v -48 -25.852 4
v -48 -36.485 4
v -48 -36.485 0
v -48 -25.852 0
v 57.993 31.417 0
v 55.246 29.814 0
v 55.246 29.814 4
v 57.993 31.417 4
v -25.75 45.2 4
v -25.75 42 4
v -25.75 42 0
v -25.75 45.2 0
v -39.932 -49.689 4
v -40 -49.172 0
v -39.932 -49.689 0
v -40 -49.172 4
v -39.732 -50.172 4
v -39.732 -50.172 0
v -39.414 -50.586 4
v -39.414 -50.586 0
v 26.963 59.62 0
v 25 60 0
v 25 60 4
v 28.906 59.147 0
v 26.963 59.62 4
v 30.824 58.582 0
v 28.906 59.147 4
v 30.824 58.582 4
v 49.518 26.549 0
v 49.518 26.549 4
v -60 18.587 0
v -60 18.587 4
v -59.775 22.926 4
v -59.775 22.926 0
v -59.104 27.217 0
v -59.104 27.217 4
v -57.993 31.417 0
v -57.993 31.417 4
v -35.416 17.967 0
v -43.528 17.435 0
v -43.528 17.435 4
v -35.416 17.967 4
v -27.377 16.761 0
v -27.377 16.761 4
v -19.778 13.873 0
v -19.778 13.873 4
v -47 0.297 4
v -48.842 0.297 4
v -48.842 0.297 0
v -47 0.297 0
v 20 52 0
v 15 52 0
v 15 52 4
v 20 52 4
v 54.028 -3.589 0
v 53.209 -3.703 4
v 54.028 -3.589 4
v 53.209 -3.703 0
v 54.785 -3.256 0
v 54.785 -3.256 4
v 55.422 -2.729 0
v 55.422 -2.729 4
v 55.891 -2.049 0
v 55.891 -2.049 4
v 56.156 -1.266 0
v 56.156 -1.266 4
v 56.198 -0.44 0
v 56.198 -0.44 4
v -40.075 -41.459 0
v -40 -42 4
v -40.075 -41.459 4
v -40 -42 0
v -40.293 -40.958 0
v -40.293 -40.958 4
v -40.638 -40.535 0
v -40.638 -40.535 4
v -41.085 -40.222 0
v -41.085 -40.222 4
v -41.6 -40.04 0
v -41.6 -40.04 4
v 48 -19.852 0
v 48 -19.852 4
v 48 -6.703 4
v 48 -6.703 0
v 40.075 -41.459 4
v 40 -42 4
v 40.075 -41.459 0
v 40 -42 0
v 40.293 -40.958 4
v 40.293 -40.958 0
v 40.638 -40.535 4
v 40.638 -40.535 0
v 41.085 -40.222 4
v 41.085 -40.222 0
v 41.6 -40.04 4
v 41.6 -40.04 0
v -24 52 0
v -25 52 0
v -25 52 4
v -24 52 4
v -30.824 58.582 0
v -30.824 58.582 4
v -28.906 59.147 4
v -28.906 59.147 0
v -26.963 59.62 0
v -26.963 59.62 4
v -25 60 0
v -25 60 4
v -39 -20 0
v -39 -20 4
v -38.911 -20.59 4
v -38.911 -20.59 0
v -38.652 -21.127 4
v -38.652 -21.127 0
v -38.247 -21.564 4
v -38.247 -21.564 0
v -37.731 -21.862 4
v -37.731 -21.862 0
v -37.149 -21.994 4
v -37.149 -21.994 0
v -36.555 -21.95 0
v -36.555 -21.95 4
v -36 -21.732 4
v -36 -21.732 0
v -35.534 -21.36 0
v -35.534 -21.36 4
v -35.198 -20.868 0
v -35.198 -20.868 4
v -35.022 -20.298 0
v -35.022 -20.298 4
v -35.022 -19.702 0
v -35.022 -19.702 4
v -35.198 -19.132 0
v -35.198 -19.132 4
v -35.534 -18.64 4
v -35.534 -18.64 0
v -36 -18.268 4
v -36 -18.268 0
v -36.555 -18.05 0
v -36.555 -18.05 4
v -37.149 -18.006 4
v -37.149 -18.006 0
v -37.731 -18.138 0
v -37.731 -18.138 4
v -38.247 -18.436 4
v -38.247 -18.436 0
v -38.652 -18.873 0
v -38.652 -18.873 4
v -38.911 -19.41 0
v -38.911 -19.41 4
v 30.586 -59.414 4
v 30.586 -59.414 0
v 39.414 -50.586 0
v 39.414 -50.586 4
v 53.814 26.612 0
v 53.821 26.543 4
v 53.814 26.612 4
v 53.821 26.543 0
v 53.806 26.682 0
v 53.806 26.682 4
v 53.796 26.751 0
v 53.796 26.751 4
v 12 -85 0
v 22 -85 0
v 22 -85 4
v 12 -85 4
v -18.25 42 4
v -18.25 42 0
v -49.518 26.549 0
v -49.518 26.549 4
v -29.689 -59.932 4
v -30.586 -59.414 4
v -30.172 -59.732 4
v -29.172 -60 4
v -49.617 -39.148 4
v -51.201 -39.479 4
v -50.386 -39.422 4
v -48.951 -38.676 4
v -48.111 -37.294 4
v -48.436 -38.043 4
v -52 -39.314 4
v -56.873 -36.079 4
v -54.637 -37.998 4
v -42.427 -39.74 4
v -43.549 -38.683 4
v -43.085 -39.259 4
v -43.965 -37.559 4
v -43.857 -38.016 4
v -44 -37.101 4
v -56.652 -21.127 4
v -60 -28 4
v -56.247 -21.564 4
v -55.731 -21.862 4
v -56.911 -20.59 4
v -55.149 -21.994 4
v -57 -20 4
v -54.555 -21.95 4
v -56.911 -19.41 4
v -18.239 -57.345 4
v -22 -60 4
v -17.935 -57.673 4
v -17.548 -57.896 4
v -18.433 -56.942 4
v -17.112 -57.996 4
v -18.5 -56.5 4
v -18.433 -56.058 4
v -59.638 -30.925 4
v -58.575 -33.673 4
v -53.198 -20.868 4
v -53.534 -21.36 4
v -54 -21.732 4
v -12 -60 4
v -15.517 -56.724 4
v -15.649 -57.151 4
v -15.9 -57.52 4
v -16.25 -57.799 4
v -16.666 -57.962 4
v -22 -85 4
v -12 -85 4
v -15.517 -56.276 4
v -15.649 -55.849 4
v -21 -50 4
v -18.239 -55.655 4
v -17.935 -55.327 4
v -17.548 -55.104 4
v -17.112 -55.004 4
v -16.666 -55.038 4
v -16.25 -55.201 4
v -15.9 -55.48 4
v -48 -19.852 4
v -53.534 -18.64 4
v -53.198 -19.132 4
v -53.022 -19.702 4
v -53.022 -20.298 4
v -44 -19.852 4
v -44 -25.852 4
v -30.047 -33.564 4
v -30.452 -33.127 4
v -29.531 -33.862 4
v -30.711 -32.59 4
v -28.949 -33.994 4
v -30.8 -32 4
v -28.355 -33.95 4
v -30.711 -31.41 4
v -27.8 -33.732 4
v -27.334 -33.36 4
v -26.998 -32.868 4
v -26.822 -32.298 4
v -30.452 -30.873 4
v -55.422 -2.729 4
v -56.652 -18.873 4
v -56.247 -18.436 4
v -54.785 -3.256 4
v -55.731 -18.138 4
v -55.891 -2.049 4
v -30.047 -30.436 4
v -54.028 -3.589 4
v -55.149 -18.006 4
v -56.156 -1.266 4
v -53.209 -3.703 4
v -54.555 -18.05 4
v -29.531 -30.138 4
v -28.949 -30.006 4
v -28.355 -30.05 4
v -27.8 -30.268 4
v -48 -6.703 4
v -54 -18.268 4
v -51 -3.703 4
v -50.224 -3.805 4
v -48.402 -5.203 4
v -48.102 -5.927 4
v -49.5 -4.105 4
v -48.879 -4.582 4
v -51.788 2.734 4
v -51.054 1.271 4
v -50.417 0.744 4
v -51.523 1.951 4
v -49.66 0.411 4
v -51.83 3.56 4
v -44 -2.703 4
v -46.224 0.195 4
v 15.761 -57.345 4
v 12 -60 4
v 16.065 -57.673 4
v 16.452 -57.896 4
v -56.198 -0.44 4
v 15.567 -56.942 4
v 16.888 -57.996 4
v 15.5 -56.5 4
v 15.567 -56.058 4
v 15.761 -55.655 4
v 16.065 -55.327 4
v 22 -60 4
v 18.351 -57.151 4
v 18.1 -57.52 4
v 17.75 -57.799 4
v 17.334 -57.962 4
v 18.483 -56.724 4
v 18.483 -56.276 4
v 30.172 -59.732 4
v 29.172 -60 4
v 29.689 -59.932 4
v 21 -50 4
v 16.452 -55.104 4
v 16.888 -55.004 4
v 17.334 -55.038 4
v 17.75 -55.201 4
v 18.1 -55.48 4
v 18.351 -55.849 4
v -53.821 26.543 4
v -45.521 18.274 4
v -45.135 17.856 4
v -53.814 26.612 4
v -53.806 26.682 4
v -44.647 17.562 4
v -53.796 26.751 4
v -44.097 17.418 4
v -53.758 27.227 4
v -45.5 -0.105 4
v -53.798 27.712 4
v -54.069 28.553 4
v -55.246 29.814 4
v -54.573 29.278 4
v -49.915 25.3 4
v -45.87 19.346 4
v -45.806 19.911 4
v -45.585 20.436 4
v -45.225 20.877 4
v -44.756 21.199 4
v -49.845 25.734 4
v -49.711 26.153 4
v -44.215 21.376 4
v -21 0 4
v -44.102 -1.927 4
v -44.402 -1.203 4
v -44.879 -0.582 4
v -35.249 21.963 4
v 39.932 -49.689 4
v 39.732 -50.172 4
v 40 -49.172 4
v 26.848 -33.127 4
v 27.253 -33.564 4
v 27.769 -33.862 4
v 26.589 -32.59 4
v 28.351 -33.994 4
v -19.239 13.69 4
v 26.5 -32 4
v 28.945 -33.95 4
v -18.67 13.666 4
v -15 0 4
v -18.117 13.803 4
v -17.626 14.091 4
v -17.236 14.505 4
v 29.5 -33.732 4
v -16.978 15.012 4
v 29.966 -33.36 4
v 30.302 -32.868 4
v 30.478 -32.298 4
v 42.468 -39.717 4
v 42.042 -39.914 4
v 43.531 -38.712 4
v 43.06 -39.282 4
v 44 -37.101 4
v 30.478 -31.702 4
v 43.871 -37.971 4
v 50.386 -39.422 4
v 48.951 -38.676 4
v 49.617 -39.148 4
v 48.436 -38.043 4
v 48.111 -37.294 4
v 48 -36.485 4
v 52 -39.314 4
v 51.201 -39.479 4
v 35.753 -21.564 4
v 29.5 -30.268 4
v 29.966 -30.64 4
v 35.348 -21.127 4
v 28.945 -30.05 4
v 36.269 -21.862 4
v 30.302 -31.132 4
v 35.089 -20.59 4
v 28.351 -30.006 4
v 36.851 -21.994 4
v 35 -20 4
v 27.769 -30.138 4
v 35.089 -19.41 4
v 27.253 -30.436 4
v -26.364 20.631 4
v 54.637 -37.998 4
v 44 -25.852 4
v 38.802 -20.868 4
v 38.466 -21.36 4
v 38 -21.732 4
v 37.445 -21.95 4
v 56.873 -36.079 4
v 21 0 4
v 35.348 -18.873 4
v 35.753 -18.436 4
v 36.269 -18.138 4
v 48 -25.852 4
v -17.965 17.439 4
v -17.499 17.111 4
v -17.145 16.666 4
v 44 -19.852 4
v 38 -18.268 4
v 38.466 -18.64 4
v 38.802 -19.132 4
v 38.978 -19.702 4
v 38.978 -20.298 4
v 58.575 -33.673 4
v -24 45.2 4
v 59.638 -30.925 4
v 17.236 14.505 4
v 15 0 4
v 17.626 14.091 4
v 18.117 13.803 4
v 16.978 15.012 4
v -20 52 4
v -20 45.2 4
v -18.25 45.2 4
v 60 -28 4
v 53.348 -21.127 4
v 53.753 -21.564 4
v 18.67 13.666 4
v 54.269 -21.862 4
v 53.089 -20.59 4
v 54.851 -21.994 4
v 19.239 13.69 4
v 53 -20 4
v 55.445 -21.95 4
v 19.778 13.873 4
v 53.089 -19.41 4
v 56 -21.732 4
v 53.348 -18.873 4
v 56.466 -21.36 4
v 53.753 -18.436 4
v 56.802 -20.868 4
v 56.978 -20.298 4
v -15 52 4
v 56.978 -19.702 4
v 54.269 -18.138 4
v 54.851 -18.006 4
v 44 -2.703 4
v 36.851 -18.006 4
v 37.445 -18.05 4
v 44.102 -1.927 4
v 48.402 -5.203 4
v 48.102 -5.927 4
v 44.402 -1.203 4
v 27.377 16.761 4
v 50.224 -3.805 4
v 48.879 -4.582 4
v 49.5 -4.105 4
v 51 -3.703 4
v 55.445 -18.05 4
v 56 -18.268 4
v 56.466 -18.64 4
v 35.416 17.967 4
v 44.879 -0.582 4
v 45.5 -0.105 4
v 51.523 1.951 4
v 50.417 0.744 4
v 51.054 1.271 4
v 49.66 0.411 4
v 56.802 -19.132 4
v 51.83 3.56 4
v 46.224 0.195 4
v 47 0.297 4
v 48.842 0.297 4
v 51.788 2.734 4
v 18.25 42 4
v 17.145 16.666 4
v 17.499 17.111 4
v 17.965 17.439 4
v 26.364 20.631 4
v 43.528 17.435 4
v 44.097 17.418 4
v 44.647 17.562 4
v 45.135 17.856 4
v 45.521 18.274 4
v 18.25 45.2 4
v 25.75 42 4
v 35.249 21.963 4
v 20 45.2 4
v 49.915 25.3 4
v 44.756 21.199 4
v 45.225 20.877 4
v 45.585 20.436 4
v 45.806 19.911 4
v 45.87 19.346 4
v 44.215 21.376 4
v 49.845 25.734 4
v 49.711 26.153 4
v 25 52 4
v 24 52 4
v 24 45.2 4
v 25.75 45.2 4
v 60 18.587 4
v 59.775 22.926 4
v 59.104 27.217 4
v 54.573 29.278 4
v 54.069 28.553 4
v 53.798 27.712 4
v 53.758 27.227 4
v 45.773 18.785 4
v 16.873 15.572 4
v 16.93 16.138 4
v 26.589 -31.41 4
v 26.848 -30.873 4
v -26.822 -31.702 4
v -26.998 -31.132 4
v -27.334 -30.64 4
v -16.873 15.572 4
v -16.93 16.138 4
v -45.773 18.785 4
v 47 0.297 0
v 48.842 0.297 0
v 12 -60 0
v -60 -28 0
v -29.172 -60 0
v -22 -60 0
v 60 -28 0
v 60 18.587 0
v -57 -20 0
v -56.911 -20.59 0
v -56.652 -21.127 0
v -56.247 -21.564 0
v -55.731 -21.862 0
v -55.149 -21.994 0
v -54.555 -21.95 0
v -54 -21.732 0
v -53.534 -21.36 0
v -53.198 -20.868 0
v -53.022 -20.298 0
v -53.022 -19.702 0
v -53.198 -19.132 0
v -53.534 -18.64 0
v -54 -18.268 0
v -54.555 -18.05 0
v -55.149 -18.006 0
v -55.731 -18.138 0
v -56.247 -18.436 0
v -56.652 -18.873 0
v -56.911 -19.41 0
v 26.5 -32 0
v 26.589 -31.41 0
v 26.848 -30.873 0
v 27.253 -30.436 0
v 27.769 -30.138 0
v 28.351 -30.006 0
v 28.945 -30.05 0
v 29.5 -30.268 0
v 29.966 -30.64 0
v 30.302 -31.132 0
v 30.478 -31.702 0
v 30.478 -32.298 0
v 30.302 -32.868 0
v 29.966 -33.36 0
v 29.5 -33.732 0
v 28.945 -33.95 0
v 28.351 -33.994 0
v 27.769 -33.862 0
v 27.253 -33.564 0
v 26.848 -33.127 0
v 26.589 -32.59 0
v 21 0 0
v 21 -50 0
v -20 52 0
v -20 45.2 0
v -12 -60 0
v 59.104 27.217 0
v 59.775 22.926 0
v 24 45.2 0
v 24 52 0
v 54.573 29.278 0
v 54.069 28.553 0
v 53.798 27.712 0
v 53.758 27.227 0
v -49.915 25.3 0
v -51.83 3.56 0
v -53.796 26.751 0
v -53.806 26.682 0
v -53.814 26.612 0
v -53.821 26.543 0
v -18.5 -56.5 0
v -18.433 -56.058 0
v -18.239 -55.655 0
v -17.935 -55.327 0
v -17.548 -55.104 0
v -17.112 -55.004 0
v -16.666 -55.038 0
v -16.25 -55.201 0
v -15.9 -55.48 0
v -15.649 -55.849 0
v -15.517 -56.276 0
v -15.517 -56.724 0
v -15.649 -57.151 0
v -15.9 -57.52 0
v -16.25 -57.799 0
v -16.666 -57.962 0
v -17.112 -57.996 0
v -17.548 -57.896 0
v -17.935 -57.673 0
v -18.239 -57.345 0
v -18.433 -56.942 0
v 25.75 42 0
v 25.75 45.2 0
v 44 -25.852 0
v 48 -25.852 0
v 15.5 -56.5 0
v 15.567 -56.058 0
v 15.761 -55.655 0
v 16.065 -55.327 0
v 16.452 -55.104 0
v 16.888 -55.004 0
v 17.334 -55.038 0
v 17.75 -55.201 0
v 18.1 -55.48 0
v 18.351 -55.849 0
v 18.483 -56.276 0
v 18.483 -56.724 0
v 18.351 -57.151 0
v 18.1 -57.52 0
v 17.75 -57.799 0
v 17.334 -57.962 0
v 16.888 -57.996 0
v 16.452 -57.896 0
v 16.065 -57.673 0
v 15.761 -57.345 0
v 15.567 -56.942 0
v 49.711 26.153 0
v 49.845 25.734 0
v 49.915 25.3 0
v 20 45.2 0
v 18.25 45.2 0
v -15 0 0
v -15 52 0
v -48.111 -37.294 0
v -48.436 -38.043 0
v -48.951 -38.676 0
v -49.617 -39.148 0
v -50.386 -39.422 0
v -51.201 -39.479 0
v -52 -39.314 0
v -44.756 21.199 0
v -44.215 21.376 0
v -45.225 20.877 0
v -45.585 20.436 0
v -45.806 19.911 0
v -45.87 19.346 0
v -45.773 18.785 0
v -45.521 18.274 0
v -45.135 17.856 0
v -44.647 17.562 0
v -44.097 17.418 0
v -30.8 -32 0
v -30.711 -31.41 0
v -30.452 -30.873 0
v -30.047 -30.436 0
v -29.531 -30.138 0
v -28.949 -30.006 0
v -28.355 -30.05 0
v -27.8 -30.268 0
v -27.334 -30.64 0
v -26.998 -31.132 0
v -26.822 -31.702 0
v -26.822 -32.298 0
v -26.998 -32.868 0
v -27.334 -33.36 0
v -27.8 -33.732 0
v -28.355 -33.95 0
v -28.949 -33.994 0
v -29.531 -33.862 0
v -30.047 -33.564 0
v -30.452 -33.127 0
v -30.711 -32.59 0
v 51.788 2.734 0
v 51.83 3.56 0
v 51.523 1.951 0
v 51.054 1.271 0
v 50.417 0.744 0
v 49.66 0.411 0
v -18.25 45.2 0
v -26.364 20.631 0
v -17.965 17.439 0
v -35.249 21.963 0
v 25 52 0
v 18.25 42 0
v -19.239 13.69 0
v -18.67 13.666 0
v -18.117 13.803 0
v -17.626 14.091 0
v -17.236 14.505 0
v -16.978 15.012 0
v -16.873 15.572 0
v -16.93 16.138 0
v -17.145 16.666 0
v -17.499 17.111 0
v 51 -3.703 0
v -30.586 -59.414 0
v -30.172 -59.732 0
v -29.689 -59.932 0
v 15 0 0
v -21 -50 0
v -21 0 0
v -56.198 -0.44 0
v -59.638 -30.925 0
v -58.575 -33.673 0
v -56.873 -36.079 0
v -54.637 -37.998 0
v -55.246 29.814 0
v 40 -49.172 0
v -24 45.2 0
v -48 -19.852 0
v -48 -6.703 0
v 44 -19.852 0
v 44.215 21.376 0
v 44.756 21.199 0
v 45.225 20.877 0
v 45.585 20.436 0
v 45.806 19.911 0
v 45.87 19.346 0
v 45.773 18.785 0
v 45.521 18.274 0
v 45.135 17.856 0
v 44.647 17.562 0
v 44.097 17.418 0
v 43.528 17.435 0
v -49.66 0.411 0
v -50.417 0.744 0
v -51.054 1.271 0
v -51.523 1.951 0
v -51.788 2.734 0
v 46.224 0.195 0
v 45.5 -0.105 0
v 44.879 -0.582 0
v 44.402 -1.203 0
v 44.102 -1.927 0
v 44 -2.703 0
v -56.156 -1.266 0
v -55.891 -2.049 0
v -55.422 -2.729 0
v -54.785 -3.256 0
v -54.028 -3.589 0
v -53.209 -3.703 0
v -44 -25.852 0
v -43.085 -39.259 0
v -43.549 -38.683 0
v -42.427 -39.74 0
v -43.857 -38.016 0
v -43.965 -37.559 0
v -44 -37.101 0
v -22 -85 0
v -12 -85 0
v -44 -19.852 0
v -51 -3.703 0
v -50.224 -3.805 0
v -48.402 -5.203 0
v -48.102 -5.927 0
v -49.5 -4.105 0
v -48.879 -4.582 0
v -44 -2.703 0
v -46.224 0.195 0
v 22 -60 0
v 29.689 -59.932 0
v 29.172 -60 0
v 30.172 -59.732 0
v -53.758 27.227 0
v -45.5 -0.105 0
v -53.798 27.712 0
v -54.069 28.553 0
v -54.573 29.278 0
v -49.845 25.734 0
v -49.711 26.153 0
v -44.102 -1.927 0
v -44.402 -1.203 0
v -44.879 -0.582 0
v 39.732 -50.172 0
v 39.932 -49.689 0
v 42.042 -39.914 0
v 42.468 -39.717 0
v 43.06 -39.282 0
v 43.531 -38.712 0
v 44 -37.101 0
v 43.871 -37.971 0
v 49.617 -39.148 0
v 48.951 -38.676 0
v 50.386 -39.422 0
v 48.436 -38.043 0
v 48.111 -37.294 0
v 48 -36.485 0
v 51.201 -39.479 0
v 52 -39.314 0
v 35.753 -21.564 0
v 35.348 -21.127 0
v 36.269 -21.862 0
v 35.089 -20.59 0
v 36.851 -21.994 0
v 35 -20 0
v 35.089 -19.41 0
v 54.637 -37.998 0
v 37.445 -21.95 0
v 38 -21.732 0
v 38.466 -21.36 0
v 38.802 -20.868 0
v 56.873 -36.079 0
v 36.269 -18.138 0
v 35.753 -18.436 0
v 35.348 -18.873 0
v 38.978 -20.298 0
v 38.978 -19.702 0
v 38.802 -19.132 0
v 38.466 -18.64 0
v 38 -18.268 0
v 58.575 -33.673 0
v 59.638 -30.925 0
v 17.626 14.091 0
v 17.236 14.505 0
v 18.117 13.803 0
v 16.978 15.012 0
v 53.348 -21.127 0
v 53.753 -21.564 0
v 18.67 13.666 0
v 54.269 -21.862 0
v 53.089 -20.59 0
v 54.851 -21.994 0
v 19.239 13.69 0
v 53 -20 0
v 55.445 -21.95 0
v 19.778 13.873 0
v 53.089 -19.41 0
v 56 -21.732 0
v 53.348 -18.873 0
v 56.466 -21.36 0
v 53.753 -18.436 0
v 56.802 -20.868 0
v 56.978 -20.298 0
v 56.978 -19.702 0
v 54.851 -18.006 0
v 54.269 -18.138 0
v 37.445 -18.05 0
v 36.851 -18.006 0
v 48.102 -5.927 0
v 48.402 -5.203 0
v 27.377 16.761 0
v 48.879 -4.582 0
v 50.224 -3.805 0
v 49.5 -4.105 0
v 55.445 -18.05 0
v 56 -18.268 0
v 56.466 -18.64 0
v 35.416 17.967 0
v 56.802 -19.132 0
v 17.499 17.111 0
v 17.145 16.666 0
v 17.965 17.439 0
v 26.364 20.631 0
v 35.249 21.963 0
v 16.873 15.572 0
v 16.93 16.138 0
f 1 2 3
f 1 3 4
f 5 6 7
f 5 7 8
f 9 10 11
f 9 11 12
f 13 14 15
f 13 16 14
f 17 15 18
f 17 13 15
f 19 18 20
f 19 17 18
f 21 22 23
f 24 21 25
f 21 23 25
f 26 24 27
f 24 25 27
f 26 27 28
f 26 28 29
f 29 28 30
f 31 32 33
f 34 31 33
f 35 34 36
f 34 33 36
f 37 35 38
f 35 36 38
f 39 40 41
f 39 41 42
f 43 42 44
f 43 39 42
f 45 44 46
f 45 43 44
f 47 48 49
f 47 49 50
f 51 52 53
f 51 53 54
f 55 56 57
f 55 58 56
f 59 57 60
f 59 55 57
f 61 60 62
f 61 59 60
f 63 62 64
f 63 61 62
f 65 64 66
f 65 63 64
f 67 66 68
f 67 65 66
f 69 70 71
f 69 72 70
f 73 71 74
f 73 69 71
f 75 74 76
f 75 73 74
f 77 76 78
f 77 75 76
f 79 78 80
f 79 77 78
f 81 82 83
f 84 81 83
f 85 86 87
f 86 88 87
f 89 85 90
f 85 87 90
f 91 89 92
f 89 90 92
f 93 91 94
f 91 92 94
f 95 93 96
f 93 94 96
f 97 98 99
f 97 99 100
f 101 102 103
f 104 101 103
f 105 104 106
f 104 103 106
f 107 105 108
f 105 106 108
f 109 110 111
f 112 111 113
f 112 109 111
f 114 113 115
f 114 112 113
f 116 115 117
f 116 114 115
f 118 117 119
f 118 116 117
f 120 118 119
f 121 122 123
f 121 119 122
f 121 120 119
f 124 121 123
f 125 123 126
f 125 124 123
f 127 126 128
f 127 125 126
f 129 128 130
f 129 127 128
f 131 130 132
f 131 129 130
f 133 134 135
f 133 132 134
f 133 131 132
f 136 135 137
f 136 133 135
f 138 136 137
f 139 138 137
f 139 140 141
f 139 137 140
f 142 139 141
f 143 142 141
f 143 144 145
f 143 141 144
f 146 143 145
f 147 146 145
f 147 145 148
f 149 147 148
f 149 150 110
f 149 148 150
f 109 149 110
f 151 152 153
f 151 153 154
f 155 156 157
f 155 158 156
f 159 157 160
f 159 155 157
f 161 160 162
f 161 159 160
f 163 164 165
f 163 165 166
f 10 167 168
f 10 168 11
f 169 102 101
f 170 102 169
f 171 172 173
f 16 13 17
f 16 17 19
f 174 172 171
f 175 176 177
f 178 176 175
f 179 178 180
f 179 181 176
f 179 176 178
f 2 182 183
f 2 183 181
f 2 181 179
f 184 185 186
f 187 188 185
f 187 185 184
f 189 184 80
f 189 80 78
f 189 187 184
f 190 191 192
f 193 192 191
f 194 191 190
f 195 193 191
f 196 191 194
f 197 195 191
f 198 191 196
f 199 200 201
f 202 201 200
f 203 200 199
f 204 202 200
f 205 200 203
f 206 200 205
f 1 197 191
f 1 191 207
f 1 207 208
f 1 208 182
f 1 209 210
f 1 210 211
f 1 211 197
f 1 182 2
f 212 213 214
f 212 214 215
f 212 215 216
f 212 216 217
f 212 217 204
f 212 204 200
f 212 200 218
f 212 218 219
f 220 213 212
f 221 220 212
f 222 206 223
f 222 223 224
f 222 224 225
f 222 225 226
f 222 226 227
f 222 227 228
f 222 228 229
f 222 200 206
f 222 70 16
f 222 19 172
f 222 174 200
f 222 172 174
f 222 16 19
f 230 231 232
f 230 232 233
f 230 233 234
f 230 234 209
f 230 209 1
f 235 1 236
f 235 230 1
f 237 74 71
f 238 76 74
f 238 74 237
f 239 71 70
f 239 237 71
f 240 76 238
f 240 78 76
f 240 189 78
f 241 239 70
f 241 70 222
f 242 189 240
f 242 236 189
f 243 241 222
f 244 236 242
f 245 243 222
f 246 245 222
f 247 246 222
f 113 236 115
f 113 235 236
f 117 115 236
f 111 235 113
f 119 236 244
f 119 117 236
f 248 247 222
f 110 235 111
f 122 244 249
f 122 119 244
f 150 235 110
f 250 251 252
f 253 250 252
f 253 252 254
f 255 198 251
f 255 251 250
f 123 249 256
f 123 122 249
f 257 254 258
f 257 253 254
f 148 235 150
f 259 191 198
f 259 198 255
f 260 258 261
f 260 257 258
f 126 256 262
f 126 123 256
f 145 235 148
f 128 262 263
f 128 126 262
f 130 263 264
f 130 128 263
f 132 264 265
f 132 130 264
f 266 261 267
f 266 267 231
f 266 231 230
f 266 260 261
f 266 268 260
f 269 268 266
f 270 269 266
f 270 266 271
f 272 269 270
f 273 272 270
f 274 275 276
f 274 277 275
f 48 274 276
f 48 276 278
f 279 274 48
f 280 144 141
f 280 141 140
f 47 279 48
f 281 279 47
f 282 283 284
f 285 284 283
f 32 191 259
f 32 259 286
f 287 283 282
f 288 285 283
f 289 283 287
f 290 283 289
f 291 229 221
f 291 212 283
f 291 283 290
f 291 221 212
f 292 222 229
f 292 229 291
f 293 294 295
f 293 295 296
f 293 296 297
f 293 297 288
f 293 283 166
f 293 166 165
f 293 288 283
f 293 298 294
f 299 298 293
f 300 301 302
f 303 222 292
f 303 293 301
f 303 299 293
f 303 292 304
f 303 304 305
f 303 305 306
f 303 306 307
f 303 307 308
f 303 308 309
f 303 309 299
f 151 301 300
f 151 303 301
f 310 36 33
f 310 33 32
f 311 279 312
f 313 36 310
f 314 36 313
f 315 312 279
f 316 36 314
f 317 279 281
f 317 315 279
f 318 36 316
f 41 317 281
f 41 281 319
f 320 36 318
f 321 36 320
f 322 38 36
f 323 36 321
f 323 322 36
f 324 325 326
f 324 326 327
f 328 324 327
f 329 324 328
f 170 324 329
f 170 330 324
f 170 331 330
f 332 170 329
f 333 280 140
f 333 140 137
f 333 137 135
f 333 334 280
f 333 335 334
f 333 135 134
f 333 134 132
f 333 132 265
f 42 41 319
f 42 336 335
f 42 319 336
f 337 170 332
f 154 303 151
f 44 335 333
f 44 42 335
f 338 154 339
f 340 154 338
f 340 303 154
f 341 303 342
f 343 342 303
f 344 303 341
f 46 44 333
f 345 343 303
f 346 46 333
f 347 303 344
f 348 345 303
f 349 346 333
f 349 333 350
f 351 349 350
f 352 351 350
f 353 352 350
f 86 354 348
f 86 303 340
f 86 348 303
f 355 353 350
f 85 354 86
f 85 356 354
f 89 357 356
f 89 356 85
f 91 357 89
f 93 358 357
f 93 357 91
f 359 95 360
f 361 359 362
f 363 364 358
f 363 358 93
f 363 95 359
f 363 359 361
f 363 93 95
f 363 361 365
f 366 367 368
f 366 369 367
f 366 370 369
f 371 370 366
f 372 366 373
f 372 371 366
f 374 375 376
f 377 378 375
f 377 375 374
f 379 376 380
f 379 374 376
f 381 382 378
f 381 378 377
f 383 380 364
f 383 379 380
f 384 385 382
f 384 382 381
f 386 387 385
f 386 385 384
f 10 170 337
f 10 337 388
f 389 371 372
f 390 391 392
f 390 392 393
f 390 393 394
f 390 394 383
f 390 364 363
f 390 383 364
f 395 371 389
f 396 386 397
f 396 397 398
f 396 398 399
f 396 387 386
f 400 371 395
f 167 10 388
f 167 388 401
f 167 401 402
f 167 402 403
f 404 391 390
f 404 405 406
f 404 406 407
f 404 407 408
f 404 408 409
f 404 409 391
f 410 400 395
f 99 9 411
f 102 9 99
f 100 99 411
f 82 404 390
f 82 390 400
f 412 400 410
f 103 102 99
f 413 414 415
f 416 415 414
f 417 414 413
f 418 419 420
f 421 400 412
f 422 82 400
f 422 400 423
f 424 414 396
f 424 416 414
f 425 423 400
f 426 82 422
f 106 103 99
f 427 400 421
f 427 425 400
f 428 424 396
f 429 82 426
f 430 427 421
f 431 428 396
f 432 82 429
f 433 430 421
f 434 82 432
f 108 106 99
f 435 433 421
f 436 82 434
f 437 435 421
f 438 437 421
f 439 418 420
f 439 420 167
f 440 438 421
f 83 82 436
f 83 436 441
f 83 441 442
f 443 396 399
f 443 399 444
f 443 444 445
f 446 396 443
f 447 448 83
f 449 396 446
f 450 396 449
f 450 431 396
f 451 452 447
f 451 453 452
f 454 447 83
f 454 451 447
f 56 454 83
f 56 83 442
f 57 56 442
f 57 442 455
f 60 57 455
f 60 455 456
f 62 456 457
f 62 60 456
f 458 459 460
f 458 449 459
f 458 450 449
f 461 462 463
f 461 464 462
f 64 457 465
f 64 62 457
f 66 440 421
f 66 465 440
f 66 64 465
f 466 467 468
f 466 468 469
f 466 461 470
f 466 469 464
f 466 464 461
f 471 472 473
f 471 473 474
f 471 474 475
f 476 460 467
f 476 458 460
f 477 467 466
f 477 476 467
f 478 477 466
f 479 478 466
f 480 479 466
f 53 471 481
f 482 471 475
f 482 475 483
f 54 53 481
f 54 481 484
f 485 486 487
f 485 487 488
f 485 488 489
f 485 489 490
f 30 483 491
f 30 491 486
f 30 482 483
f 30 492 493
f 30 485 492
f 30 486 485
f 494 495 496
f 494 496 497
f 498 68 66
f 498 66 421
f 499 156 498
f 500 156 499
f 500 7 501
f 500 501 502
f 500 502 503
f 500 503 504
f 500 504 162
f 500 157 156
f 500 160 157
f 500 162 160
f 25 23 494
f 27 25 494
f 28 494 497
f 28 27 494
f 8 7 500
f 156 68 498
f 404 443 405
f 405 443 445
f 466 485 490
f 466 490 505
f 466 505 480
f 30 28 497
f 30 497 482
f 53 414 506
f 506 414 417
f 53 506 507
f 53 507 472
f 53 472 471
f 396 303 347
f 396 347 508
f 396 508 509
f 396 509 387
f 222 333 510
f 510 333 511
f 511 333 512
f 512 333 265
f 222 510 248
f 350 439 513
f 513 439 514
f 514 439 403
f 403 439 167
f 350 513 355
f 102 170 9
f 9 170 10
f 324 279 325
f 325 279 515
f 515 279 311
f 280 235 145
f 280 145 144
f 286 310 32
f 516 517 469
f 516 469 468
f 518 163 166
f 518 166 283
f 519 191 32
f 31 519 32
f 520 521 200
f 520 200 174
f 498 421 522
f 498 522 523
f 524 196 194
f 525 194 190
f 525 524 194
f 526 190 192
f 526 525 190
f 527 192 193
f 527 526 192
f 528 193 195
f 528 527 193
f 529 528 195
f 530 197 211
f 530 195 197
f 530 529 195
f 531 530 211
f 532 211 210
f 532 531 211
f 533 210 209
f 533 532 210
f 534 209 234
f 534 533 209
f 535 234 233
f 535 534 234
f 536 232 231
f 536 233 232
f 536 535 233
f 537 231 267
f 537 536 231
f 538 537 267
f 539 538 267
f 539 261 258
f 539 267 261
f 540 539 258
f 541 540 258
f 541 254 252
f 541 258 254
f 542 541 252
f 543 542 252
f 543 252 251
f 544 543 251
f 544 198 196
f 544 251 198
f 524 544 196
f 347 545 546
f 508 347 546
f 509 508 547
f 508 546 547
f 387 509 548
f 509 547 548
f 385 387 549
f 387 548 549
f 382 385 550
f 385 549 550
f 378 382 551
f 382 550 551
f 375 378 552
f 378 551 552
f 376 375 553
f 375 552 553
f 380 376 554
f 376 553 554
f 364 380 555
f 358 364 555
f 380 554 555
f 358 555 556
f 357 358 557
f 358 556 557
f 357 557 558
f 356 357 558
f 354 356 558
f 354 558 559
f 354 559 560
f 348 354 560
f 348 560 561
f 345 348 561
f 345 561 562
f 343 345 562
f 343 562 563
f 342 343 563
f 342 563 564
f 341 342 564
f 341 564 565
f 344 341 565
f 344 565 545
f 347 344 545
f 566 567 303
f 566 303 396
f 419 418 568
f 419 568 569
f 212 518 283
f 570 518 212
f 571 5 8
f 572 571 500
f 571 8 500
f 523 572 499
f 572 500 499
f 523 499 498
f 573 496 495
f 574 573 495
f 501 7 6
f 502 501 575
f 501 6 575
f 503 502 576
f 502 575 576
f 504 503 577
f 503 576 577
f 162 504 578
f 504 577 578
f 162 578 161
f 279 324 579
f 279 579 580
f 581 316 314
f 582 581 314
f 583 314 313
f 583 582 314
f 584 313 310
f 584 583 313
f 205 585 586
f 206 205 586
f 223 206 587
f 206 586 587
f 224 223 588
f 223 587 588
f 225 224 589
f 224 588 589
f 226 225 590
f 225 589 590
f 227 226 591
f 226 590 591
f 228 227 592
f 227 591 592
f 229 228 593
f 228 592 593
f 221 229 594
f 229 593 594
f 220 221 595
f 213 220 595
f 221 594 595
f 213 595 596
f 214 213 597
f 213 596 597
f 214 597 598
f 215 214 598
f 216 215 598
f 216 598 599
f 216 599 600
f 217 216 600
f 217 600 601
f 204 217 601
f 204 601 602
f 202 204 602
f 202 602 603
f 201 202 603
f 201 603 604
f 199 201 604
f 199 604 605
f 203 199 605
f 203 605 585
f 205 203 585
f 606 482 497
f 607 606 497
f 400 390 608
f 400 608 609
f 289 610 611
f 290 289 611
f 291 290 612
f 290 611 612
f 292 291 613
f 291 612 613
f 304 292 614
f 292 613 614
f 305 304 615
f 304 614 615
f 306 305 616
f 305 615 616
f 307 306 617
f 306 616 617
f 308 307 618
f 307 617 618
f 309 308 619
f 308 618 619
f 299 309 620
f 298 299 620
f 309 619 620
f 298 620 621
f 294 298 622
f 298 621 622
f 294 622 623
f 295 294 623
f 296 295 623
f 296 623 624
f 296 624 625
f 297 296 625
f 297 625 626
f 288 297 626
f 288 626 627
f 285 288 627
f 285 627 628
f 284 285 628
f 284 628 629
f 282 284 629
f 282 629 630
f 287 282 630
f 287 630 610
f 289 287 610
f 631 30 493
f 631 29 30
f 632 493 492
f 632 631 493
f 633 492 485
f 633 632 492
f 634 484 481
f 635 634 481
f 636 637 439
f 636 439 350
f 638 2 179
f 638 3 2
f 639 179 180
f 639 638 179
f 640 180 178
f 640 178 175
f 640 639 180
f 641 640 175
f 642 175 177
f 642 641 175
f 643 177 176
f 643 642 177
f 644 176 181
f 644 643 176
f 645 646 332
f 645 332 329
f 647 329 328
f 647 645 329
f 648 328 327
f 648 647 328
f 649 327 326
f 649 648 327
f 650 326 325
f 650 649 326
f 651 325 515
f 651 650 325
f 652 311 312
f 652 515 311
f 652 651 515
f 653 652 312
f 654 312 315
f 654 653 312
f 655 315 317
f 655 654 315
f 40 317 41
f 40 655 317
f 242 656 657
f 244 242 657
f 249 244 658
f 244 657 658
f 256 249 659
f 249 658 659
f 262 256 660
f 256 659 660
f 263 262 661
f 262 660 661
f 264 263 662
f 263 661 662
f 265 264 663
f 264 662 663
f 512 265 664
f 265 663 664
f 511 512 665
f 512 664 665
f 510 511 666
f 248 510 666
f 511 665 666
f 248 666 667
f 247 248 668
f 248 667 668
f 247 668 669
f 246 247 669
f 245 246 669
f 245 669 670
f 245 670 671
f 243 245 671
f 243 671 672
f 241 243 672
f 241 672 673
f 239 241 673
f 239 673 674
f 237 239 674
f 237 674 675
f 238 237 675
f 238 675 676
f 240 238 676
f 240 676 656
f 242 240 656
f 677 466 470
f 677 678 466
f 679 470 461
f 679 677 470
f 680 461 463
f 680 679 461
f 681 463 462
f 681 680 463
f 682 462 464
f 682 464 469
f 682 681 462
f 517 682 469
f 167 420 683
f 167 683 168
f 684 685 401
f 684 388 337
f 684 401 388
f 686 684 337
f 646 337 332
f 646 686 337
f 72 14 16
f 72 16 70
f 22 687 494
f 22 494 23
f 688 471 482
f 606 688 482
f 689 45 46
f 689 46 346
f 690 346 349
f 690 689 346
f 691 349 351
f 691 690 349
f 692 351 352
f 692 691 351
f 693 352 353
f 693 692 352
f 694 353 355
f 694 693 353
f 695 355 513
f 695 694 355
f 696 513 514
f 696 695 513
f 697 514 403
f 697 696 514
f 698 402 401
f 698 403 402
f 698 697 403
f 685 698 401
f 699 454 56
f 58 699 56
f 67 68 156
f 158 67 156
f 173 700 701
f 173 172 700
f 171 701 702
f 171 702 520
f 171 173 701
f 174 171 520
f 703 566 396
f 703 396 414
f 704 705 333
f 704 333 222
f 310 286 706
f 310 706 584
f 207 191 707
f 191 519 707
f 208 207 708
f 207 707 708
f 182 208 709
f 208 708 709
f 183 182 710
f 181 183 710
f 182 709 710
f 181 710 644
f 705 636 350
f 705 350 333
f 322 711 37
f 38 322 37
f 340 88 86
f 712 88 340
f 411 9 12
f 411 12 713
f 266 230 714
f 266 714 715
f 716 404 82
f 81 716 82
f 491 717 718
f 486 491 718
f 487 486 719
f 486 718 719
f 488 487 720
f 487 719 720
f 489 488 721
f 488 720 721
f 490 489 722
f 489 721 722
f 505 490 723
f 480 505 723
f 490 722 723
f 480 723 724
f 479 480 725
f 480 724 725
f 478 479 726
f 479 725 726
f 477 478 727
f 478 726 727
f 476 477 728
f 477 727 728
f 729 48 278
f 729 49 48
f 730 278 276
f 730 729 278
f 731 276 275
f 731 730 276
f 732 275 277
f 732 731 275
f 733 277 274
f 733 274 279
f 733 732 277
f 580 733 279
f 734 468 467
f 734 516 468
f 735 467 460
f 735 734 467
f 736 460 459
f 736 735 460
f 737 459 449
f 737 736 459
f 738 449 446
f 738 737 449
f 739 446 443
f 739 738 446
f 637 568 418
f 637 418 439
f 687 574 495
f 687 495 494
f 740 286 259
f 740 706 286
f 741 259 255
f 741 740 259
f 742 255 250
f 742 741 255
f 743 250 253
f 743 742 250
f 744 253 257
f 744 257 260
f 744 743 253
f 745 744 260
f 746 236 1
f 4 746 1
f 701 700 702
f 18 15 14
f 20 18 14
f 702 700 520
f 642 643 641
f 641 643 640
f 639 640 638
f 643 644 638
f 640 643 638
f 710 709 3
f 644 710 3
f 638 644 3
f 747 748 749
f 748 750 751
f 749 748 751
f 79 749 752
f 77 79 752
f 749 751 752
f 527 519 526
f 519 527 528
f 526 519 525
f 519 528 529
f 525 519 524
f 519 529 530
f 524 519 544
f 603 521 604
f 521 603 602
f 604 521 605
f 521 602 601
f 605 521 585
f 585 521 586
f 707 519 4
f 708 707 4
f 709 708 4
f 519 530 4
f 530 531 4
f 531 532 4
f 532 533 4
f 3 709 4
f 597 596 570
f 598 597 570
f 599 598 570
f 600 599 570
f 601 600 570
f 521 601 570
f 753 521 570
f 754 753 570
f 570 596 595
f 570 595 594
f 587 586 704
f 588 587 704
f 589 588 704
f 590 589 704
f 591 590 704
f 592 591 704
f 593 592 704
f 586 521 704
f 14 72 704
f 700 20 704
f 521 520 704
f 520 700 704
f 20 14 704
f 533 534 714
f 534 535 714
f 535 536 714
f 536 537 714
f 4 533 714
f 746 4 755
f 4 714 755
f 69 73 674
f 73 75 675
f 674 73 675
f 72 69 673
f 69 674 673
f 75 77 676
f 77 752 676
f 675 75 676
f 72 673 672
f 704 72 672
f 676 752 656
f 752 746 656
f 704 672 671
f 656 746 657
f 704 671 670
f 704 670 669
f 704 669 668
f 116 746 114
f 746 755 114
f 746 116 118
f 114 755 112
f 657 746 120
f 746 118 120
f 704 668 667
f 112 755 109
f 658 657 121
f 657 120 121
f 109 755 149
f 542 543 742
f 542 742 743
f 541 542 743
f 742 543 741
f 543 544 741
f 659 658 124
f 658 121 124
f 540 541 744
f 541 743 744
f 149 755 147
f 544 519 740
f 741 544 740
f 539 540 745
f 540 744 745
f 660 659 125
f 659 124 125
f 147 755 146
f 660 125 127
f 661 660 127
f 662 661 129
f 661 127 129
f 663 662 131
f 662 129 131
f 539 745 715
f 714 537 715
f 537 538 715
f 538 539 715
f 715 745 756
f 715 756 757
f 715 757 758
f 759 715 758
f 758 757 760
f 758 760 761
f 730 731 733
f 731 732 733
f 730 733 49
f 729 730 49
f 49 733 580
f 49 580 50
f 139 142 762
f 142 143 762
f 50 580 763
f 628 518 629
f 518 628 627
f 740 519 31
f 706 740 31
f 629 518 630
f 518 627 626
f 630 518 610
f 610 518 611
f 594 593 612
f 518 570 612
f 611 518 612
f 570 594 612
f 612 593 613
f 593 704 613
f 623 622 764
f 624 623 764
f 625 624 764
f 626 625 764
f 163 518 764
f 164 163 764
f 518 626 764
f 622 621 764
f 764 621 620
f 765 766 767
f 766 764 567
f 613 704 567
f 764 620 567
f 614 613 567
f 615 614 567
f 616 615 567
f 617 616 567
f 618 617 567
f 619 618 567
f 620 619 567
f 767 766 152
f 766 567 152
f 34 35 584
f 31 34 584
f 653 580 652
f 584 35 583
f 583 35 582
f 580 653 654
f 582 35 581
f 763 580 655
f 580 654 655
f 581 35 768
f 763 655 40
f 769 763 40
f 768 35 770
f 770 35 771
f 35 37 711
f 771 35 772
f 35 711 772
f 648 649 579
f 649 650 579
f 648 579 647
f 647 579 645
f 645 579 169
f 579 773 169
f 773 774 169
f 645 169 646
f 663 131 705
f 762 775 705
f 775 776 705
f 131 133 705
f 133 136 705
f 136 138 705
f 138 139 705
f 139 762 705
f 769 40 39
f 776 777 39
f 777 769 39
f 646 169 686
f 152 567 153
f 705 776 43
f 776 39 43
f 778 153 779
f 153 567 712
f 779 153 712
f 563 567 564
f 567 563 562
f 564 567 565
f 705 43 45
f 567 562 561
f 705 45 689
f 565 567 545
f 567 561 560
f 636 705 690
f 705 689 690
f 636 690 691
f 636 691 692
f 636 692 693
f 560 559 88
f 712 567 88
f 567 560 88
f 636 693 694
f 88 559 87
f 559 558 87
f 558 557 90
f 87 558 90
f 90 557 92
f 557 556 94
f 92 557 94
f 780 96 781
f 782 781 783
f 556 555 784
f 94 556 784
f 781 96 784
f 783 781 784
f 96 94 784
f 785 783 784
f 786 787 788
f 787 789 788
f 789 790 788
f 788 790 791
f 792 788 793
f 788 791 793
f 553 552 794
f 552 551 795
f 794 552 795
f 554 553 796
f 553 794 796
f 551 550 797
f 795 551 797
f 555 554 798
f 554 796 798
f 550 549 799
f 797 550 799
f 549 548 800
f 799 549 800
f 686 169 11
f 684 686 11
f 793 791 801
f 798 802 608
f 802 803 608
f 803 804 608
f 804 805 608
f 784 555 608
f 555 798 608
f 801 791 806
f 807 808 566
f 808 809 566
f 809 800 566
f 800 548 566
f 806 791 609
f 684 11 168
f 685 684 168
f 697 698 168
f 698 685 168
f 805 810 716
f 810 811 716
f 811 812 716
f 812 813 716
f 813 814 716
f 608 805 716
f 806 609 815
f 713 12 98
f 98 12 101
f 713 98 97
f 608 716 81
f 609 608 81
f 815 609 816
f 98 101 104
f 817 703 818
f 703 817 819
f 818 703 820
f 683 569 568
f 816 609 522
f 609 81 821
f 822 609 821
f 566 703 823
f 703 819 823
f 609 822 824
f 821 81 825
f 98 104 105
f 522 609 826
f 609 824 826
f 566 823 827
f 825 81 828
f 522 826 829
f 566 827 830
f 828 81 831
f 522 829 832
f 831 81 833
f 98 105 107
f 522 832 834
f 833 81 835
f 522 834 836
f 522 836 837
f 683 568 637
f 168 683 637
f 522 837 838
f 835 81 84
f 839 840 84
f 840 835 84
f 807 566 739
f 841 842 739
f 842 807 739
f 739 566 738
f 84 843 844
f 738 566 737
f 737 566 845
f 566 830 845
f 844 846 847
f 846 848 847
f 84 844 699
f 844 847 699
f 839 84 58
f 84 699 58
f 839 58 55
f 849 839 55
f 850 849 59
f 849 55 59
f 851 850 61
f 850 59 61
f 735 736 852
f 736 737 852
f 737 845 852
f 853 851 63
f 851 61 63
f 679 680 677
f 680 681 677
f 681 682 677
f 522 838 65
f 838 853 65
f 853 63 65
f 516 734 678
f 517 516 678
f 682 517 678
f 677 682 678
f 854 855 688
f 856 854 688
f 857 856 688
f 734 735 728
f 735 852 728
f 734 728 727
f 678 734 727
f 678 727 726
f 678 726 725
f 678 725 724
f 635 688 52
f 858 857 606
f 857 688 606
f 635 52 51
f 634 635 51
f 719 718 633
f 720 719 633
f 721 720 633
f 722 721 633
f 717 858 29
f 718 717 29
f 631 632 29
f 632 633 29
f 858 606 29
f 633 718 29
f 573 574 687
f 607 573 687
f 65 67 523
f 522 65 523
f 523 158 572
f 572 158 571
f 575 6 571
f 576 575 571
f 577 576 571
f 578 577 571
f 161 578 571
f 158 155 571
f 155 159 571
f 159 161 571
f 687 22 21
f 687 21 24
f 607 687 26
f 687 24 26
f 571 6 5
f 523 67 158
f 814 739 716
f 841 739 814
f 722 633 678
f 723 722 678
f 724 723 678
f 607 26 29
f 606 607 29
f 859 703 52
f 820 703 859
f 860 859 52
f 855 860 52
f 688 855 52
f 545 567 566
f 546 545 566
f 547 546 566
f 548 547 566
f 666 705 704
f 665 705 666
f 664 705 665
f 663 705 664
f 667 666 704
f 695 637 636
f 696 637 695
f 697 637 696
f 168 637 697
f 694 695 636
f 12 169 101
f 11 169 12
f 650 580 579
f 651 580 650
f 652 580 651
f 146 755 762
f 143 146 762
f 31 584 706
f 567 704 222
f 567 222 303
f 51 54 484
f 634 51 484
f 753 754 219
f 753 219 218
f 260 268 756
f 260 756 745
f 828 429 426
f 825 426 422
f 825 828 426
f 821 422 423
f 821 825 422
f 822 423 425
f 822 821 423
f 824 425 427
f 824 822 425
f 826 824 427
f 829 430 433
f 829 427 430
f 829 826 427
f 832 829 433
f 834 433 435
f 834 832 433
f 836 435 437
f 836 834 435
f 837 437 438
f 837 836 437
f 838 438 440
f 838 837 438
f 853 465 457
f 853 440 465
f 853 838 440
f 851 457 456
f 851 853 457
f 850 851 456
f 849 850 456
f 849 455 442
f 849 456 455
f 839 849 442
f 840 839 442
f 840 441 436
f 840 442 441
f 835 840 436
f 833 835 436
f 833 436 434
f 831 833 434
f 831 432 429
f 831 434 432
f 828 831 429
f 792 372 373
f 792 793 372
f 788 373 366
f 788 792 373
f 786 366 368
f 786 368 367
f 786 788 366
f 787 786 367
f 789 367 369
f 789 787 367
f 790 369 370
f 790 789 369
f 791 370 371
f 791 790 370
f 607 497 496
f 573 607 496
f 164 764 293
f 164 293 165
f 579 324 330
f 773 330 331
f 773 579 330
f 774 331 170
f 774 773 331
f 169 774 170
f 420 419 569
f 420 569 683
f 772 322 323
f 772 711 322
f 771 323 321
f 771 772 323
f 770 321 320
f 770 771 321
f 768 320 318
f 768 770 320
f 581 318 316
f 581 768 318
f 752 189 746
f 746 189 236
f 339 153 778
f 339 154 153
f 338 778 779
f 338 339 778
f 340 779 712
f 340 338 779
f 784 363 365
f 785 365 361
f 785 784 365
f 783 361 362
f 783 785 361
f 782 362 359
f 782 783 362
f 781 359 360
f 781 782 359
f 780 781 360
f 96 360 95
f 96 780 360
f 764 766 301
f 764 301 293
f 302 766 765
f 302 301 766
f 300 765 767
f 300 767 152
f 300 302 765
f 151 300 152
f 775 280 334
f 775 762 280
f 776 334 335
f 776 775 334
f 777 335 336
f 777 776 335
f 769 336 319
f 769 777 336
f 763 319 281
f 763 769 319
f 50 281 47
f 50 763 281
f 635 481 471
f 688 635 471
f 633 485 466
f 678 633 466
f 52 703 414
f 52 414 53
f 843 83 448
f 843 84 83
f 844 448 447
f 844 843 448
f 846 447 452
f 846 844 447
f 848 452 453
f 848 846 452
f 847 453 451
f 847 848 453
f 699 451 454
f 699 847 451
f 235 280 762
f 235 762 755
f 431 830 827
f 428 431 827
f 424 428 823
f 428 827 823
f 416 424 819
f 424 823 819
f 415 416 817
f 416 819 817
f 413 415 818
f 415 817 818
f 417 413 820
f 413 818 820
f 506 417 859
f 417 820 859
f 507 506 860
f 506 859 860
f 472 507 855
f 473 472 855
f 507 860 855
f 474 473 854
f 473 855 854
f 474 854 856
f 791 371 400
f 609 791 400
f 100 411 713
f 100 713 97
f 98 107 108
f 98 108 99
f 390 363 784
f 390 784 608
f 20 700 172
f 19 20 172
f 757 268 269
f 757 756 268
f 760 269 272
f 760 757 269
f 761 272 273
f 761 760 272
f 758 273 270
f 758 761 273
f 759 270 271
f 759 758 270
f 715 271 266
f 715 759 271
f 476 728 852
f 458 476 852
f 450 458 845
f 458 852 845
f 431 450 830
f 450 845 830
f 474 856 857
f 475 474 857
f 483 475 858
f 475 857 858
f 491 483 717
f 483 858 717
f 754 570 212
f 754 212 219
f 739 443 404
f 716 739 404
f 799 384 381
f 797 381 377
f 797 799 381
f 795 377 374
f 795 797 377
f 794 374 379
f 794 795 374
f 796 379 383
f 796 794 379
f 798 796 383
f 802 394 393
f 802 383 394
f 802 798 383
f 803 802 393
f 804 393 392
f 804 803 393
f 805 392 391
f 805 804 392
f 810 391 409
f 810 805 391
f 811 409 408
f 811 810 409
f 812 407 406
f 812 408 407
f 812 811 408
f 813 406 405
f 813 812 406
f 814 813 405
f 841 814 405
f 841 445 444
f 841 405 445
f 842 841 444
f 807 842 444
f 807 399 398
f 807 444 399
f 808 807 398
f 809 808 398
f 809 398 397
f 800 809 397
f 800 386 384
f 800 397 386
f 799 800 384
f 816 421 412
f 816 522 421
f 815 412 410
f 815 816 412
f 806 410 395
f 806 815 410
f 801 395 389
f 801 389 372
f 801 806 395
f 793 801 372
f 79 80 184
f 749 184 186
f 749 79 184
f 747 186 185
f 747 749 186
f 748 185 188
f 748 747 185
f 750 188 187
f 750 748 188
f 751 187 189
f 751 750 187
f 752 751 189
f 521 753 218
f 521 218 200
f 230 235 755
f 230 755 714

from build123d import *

# Parameters (mm, degrees)
BOSS_EXTRUDE1_DEPTH = 4
SKETCH2_R           = 2
SKETCH2_R_2         = 1.5
CUT_EXTRUDE1_DEPTH  = 95.026591983
SKETCH4_W           = 20
SKETCH4_H           = 100
BOSS_EXTRUDE2_DEPTH = 4
FILLET3_R           = 42
FILLET4_R           = 12
SKETCH7_R           = 2
CUT_EXTRUDE3_DEPTH  = 105.120122935
CHAMFER1_SIZE       = 10
FILLET8_R           = 2
CUT_EXTRUDE4_DEPTH  = 105.120122935
CUT_EXTRUDE5_DEPTH  = 105.120122935
SKETCH10_W          = 4
SKETCH10_H          = 14.148423286
CUT_EXTRUDE6_DEPTH  = 105.120122935
FILLET11_R          = 3
FILLET12_R          = 3


with BuildPart() as part:
    # Sketch1 → Boss-Extrude1 (new body)
    with BuildSketch(Plane.XY):
        Polygon((-40, 60), (-25, 60), (-25, 52), (-15, 52), (-15, 0), (-21, 0), (-21, -50), (21, -50), (21, 0), (15, 0), (15, 52), (25, 52), (25, 60), (40, 60), (40, -60), (22, -60), (22, -85), (12, -85), (12, -60), (-12, -60), (-12, -85), (-22, -85), (-22, -60), (-40, -60), align=None)
    extrude(amount=BOSS_EXTRUDE1_DEPTH)

    # Sketch2 → Cut-Extrude1 (cut, through all)
    with BuildSketch(Plane(origin=(0, 0, 0), x_dir=(-1, 0, 0), z_dir=(0, 0, -1))):
        with Locations((-28.5, -32)):
            Circle(SKETCH2_R)
        with Locations((17, -56.5)):
            Circle(SKETCH2_R_2)
        with Locations((28.8, -32)):
            Circle(SKETCH2_R)
        with Locations((-17, -56.5)):
            Circle(SKETCH2_R_2)
    extrude(amount=-CUT_EXTRUDE1_DEPTH, mode=Mode.SUBTRACT)

    # Sketch4 → Boss-Extrude2 (add)
    with BuildSketch(Plane.XY.offset(4)):
        with Locations((-50, 10)):
            Rectangle(SKETCH4_W, SKETCH4_H)
        with Locations((50, 10)):
            Rectangle(SKETCH4_W, SKETCH4_H)
    extrude(amount=-BOSS_EXTRUDE2_DEPTH)

    # Fillet3
    # the kernel refuses this fillet: 42 mm, written as the material it takes off along each edge
    with BuildSketch(Plane(origin=(60, 60, 107.531396204), x_dir=(0, -1, 0), z_dir=(0, 0, -1))) as fillet3_piece_1:
        with BuildLine():
            CenterArc((41.412558482, 42), FILLET3_R, 189.594068227, 80.405931773)
            Line((0, 35), (-0.82825117, 34.86))
            ThreePointArc((-0.82825117, 34.86), (-0.84, 17.5), (-0.84, 0))
            Line((-0.84, 0), (0, -0.84))
            Line((0, -0.84), (41.412558482, -0.84))
            Line((41.412558482, -0.84), (41.412558482, 0))
        make_face()
    extrude(amount=211.062792409, mode=Mode.SUBTRACT)
    with BuildSketch(Plane(origin=(-60, 60, 107.531396204), x_dir=(1, 0, 0), z_dir=(0, 0, -1))) as fillet3_piece_2:
        with BuildLine():
            CenterArc((42, 41.412558482), FILLET3_R, 180, 80.405931773)
            Line((0, 41.412558482), (-0.84, 41.412558482))
            Line((-0.84, 41.412558482), (-0.84, 0))
            Line((-0.84, 0), (0, -0.84))
            ThreePointArc((0, -0.84), (17.5, -0.84), (34.86, -0.82825117))
            Line((34.86, -0.82825117), (35, 0))
        make_face()
    extrude(amount=211.062792409, mode=Mode.SUBTRACT)

    # Fillet4
    fillet4_edges = [part.edges().sort_by_distance(p)[0] for p in [
        (60, -40, 2),
        (-60, -40, 2),
    ]]
    fillet(fillet4_edges, radius=FILLET4_R)

    # Sketch7 → Cut-Extrude3 (cut, through all)
    with BuildSketch(Plane.XY):
        with Locations(Location((-55, -20, 0), (0, 0, 180))):
            Circle(SKETCH7_R)
        with Locations(Location((55, -20, 0), (0, 0, 180))):
            Circle(SKETCH7_R)
        with Locations(Location((-37, -20, 0), (0, 0, 180))):
            Circle(SKETCH7_R)
        with Locations(Location((37, -20, 0), (0, 0, 180))):
            Circle(SKETCH7_R)
    extrude(amount=CUT_EXTRUDE3_DEPTH, mode=Mode.SUBTRACT)

    # Chamfer1
    chamfer1_edges = [part.edges().sort_by_distance(p)[0] for p in [
        (-40, -60, 2),
        (40, -60, 2),
    ]]
    chamfer(chamfer1_edges, length=CHAMFER1_SIZE)

    # Fillet8
    fillet8_edges = [part.edges().sort_by_distance(p)[0] for p in [
        (-30, -60, 2),
        (-40, -50, 2),
        (30, -60, 2),
        (40, -50, 2),
        (40, -40, 2),
        (-40, -40, 2),
    ]]
    fillet(fillet8_edges, radius=FILLET8_R)

    # Sketch8 → Cut-Extrude4 (cut, through all)
    with BuildSketch(Plane(origin=(0, 0, 0), x_dir=(-1, 0, 0), z_dir=(0, 0, -1))):
        with BuildLine():
            ThreePointArc((-17.964817996, 17.438774634), (-30.770630407, 21.535466224), (-44.214817996, 21.375674028))
            ThreePointArc((-44.214817996, 21.375674028), (-45.841525426, 19.061841075), (-43.527692473, 17.435133644))
            ThreePointArc((-43.527692473, 17.435133644), (-31.363903701, 17.579707536), (-19.777692473, 13.87317705))
            ThreePointArc((-19.777692473, 13.87317705), (-17.088456442, 14.749538603), (-17.964817996, 17.438774634))
        make_face()
        with BuildLine():
            ThreePointArc((17.964817996, 17.438774634), (30.770630407, 21.535466224), (44.214817996, 21.375674028))
            ThreePointArc((44.214817996, 21.375674028), (45.841525426, 19.061841075), (43.527692473, 17.435133644))
            ThreePointArc((43.527692473, 17.435133644), (31.363903701, 17.579707536), (19.777692473, 13.87317705))
            ThreePointArc((19.777692473, 13.87317705), (17.088456442, 14.749538603), (17.964817996, 17.438774634))
        make_face()
    extrude(amount=-CUT_EXTRUDE4_DEPTH, mode=Mode.SUBTRACT)

    # Sketch9 → Cut-Extrude5 (cut, through all)
    with BuildSketch(Plane.XY.offset(4)):
        Polygon((-24, 52), (-20, 52), (-20, 45.2), (-18.25, 45.2), (-18.25, 42), (-25.75, 42), (-25.75, 45.2), (-24, 45.2), align=None)
    cut_extrude5 = extrude(amount=-CUT_EXTRUDE5_DEPTH, mode=Mode.SUBTRACT)

    # Mirror1: Cut-Extrude5 across plane
    add(cut_extrude5.mirror(Plane(origin=(0, 0, 0), x_dir=(0, 0, 1), z_dir=(1, 0, 0))), mode=Mode.SUBTRACT)

    # Sketch10 → Cut-Extrude6 (cut, through all)
    with BuildSketch(Plane.XY.offset(4)):
        with Locations((46, -32.925788357)):
            Rectangle(SKETCH10_W, SKETCH10_H)
        with BuildLine():
            Line((44, -19.851576714), (48, -19.851576714))
            Line((48, -19.851576714), (48, -3.703153428))
            Line((48, -3.703153428), (56.485281374, -3.703153428))
            Line((56.485281374, -3.703153428), (53.762388988, 27.211478811))
            Line((53.762388988, 27.211478811), (53.006446404, 28.506843132))
            Line((53.006446404, 28.506843132), (57.992638284, 31.416661411))
            ThreePointArc((57.992638284, 31.416661411), (47.696624216, 48.287786805), (30.824208916, 58.581686925))
            Line((30.824208916, 58.581686925), (49.856368895, 25.968653244))
            Line((49.856368895, 25.968653244), (52.117484809, 0.296846572))
            Line((52.117484809, 0.296846572), (44, 0.296846572))
            Line((44, 0.296846572), (44, -19.851576714))
        make_face()
    cut_extrude6 = extrude(amount=-CUT_EXTRUDE6_DEPTH, mode=Mode.SUBTRACT)

    # Mirror5: Cut-Extrude6 across plane
    add(cut_extrude6.mirror(Plane(origin=(0, 0, 0), x_dir=(0, 0, 1), z_dir=(1, 0, 0))), mode=Mode.SUBTRACT)

    # Fillet11
    fillet11_edges = [part.edges().sort_by_distance(p)[0] for p in [
        (-53.762388988, 27.211478811, 2),
        (-49.856368895, 25.968653244, 2),
        (-52.117484809, 0.296846572, 2),
        (-56.485281374, -3.703153428, 2),
        (-48, -3.703153428, 2),
        (-44, 0.296846572, 2),
        (-48, -40, 2),
        (-44, -40, 2),
        (53.762388988, 27.211478811, 2),
        (49.856368895, 25.968653244, 2),
        (52.117484809, 0.296846572, 2),
        (56.485281374, -3.703153428, 2),
        (48, -3.703153428, 2),
        (44, 0.296846572, 2),
        (44, -40, 2),
        (48, -40, 2),
    ]]
    fillet(fillet11_edges, radius=FILLET11_R)

    # Fillet12
    fillet12_edges = [part.edges().sort_by_distance(p)[0] for p in [
        (-53.006446404, 28.506843132, 2),
        (53.006446404, 28.506843132, 2),
    ]]
    fillet(fillet12_edges, radius=FILLET12_R)


solid = part.part
